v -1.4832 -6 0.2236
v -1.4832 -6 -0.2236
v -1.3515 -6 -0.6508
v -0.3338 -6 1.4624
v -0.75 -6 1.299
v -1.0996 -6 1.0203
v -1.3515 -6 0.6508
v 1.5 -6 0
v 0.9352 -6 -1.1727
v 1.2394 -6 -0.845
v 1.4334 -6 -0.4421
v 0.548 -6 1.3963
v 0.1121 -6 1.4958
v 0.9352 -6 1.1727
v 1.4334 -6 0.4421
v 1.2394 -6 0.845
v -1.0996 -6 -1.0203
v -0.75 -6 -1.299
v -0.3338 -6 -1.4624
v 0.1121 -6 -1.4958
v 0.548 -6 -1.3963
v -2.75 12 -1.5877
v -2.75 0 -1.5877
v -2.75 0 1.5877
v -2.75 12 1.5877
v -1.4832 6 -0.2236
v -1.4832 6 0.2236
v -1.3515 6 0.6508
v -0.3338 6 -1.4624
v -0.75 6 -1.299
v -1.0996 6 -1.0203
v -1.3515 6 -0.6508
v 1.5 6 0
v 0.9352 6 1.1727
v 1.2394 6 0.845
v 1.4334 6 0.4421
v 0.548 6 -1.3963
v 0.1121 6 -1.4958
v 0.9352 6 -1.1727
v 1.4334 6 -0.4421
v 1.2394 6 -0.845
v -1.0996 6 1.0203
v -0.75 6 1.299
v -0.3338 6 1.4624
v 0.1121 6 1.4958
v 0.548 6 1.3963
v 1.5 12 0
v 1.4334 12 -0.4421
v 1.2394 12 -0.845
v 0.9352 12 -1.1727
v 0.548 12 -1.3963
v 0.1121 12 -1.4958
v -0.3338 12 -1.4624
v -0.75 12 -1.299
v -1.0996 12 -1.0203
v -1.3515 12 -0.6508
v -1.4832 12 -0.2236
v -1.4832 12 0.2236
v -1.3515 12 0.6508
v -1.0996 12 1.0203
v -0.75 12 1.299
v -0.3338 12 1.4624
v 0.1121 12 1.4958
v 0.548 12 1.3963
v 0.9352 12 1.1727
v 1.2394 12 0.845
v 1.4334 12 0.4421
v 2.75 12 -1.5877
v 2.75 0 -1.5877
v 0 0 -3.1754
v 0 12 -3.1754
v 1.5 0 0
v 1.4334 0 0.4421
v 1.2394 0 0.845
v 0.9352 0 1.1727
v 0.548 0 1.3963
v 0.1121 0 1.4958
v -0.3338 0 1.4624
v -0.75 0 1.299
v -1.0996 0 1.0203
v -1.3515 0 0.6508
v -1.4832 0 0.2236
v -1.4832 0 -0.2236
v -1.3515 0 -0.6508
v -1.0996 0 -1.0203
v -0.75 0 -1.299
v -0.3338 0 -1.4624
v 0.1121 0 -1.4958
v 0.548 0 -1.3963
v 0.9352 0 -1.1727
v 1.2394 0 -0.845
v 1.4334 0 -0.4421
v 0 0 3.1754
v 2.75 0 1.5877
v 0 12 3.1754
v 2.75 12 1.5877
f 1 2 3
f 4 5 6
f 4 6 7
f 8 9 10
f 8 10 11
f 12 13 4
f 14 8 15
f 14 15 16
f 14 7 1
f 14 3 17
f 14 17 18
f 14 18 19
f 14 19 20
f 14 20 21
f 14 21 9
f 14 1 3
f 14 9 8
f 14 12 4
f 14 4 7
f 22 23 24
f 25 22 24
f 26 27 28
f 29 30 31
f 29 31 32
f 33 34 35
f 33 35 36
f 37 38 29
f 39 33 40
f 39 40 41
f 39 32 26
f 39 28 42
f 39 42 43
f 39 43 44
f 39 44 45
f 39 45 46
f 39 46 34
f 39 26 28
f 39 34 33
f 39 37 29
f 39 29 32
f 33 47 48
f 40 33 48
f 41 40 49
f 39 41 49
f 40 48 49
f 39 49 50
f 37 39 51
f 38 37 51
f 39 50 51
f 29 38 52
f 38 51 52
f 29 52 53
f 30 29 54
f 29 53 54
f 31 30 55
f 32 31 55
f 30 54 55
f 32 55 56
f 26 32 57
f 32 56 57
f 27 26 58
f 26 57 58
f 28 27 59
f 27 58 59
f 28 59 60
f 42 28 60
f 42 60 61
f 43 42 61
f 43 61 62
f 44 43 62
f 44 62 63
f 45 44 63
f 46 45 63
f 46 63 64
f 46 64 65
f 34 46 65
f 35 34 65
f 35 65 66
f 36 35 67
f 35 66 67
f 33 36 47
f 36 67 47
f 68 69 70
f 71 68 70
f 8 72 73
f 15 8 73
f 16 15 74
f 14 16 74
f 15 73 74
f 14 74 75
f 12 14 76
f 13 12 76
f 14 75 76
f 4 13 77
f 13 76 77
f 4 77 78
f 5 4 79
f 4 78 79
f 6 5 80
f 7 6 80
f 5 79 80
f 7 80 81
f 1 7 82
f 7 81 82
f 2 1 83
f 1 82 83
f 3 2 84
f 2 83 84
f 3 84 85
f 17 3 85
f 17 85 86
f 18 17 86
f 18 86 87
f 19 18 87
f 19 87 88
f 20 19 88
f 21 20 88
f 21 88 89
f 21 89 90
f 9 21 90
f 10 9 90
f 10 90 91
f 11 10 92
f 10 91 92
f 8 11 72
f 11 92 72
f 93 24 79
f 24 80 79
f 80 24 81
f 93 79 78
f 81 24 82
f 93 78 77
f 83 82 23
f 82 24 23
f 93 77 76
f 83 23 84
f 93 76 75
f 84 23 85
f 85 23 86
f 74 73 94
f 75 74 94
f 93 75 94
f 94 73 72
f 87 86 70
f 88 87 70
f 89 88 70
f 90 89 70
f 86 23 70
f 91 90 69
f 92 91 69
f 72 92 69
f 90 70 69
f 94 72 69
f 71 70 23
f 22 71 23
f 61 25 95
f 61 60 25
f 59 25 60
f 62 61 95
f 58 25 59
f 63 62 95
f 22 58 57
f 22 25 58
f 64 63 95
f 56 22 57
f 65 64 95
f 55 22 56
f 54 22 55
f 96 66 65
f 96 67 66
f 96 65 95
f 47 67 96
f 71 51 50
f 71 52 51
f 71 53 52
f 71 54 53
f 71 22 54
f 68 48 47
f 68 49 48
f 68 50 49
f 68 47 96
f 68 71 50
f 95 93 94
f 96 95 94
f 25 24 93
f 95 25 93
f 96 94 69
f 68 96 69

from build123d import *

# Parameters (mm, degrees)
SALIENTE_EXTRUIR1_DEPTH = 12
CROQUIS2_R              = 1.5
SALIENTE_EXTRUIR2_DEPTH = 6
CROQUIS3_R              = 1.5
CORTAR_EXTRUIR1_DEPTH   = 6


with BuildPart() as part:
    # Croquis1 → Saliente-Extruir1 (new body)
    with BuildSketch(Plane(origin=(0, 0, 0), x_dir=(1, 0, 0), z_dir=(0, 1, 0))):
        Polygon((0, 3.175426481), (-2.75, 1.58771324), (-2.75, -1.58771324), (0, -3.175426481), (2.75, -1.58771324), (2.75, 1.58771324), align=None)
    extrude(amount=SALIENTE_EXTRUIR1_DEPTH)

    # Croquis2 → Saliente-Extruir2 (add)
    with BuildSketch(Plane.XZ):
        Circle(CROQUIS2_R)
    extrude(amount=SALIENTE_EXTRUIR2_DEPTH)

    # Croquis3 → Cortar-Extruir1 (cut)
    with BuildSketch(Plane(origin=(0, 12, 0), x_dir=(1, 0, 0), z_dir=(0, 1, 0))):
        Circle(CROQUIS3_R)
    extrude(amount=-CORTAR_EXTRUIR1_DEPTH, mode=Mode.SUBTRACT)


solid = part.part
